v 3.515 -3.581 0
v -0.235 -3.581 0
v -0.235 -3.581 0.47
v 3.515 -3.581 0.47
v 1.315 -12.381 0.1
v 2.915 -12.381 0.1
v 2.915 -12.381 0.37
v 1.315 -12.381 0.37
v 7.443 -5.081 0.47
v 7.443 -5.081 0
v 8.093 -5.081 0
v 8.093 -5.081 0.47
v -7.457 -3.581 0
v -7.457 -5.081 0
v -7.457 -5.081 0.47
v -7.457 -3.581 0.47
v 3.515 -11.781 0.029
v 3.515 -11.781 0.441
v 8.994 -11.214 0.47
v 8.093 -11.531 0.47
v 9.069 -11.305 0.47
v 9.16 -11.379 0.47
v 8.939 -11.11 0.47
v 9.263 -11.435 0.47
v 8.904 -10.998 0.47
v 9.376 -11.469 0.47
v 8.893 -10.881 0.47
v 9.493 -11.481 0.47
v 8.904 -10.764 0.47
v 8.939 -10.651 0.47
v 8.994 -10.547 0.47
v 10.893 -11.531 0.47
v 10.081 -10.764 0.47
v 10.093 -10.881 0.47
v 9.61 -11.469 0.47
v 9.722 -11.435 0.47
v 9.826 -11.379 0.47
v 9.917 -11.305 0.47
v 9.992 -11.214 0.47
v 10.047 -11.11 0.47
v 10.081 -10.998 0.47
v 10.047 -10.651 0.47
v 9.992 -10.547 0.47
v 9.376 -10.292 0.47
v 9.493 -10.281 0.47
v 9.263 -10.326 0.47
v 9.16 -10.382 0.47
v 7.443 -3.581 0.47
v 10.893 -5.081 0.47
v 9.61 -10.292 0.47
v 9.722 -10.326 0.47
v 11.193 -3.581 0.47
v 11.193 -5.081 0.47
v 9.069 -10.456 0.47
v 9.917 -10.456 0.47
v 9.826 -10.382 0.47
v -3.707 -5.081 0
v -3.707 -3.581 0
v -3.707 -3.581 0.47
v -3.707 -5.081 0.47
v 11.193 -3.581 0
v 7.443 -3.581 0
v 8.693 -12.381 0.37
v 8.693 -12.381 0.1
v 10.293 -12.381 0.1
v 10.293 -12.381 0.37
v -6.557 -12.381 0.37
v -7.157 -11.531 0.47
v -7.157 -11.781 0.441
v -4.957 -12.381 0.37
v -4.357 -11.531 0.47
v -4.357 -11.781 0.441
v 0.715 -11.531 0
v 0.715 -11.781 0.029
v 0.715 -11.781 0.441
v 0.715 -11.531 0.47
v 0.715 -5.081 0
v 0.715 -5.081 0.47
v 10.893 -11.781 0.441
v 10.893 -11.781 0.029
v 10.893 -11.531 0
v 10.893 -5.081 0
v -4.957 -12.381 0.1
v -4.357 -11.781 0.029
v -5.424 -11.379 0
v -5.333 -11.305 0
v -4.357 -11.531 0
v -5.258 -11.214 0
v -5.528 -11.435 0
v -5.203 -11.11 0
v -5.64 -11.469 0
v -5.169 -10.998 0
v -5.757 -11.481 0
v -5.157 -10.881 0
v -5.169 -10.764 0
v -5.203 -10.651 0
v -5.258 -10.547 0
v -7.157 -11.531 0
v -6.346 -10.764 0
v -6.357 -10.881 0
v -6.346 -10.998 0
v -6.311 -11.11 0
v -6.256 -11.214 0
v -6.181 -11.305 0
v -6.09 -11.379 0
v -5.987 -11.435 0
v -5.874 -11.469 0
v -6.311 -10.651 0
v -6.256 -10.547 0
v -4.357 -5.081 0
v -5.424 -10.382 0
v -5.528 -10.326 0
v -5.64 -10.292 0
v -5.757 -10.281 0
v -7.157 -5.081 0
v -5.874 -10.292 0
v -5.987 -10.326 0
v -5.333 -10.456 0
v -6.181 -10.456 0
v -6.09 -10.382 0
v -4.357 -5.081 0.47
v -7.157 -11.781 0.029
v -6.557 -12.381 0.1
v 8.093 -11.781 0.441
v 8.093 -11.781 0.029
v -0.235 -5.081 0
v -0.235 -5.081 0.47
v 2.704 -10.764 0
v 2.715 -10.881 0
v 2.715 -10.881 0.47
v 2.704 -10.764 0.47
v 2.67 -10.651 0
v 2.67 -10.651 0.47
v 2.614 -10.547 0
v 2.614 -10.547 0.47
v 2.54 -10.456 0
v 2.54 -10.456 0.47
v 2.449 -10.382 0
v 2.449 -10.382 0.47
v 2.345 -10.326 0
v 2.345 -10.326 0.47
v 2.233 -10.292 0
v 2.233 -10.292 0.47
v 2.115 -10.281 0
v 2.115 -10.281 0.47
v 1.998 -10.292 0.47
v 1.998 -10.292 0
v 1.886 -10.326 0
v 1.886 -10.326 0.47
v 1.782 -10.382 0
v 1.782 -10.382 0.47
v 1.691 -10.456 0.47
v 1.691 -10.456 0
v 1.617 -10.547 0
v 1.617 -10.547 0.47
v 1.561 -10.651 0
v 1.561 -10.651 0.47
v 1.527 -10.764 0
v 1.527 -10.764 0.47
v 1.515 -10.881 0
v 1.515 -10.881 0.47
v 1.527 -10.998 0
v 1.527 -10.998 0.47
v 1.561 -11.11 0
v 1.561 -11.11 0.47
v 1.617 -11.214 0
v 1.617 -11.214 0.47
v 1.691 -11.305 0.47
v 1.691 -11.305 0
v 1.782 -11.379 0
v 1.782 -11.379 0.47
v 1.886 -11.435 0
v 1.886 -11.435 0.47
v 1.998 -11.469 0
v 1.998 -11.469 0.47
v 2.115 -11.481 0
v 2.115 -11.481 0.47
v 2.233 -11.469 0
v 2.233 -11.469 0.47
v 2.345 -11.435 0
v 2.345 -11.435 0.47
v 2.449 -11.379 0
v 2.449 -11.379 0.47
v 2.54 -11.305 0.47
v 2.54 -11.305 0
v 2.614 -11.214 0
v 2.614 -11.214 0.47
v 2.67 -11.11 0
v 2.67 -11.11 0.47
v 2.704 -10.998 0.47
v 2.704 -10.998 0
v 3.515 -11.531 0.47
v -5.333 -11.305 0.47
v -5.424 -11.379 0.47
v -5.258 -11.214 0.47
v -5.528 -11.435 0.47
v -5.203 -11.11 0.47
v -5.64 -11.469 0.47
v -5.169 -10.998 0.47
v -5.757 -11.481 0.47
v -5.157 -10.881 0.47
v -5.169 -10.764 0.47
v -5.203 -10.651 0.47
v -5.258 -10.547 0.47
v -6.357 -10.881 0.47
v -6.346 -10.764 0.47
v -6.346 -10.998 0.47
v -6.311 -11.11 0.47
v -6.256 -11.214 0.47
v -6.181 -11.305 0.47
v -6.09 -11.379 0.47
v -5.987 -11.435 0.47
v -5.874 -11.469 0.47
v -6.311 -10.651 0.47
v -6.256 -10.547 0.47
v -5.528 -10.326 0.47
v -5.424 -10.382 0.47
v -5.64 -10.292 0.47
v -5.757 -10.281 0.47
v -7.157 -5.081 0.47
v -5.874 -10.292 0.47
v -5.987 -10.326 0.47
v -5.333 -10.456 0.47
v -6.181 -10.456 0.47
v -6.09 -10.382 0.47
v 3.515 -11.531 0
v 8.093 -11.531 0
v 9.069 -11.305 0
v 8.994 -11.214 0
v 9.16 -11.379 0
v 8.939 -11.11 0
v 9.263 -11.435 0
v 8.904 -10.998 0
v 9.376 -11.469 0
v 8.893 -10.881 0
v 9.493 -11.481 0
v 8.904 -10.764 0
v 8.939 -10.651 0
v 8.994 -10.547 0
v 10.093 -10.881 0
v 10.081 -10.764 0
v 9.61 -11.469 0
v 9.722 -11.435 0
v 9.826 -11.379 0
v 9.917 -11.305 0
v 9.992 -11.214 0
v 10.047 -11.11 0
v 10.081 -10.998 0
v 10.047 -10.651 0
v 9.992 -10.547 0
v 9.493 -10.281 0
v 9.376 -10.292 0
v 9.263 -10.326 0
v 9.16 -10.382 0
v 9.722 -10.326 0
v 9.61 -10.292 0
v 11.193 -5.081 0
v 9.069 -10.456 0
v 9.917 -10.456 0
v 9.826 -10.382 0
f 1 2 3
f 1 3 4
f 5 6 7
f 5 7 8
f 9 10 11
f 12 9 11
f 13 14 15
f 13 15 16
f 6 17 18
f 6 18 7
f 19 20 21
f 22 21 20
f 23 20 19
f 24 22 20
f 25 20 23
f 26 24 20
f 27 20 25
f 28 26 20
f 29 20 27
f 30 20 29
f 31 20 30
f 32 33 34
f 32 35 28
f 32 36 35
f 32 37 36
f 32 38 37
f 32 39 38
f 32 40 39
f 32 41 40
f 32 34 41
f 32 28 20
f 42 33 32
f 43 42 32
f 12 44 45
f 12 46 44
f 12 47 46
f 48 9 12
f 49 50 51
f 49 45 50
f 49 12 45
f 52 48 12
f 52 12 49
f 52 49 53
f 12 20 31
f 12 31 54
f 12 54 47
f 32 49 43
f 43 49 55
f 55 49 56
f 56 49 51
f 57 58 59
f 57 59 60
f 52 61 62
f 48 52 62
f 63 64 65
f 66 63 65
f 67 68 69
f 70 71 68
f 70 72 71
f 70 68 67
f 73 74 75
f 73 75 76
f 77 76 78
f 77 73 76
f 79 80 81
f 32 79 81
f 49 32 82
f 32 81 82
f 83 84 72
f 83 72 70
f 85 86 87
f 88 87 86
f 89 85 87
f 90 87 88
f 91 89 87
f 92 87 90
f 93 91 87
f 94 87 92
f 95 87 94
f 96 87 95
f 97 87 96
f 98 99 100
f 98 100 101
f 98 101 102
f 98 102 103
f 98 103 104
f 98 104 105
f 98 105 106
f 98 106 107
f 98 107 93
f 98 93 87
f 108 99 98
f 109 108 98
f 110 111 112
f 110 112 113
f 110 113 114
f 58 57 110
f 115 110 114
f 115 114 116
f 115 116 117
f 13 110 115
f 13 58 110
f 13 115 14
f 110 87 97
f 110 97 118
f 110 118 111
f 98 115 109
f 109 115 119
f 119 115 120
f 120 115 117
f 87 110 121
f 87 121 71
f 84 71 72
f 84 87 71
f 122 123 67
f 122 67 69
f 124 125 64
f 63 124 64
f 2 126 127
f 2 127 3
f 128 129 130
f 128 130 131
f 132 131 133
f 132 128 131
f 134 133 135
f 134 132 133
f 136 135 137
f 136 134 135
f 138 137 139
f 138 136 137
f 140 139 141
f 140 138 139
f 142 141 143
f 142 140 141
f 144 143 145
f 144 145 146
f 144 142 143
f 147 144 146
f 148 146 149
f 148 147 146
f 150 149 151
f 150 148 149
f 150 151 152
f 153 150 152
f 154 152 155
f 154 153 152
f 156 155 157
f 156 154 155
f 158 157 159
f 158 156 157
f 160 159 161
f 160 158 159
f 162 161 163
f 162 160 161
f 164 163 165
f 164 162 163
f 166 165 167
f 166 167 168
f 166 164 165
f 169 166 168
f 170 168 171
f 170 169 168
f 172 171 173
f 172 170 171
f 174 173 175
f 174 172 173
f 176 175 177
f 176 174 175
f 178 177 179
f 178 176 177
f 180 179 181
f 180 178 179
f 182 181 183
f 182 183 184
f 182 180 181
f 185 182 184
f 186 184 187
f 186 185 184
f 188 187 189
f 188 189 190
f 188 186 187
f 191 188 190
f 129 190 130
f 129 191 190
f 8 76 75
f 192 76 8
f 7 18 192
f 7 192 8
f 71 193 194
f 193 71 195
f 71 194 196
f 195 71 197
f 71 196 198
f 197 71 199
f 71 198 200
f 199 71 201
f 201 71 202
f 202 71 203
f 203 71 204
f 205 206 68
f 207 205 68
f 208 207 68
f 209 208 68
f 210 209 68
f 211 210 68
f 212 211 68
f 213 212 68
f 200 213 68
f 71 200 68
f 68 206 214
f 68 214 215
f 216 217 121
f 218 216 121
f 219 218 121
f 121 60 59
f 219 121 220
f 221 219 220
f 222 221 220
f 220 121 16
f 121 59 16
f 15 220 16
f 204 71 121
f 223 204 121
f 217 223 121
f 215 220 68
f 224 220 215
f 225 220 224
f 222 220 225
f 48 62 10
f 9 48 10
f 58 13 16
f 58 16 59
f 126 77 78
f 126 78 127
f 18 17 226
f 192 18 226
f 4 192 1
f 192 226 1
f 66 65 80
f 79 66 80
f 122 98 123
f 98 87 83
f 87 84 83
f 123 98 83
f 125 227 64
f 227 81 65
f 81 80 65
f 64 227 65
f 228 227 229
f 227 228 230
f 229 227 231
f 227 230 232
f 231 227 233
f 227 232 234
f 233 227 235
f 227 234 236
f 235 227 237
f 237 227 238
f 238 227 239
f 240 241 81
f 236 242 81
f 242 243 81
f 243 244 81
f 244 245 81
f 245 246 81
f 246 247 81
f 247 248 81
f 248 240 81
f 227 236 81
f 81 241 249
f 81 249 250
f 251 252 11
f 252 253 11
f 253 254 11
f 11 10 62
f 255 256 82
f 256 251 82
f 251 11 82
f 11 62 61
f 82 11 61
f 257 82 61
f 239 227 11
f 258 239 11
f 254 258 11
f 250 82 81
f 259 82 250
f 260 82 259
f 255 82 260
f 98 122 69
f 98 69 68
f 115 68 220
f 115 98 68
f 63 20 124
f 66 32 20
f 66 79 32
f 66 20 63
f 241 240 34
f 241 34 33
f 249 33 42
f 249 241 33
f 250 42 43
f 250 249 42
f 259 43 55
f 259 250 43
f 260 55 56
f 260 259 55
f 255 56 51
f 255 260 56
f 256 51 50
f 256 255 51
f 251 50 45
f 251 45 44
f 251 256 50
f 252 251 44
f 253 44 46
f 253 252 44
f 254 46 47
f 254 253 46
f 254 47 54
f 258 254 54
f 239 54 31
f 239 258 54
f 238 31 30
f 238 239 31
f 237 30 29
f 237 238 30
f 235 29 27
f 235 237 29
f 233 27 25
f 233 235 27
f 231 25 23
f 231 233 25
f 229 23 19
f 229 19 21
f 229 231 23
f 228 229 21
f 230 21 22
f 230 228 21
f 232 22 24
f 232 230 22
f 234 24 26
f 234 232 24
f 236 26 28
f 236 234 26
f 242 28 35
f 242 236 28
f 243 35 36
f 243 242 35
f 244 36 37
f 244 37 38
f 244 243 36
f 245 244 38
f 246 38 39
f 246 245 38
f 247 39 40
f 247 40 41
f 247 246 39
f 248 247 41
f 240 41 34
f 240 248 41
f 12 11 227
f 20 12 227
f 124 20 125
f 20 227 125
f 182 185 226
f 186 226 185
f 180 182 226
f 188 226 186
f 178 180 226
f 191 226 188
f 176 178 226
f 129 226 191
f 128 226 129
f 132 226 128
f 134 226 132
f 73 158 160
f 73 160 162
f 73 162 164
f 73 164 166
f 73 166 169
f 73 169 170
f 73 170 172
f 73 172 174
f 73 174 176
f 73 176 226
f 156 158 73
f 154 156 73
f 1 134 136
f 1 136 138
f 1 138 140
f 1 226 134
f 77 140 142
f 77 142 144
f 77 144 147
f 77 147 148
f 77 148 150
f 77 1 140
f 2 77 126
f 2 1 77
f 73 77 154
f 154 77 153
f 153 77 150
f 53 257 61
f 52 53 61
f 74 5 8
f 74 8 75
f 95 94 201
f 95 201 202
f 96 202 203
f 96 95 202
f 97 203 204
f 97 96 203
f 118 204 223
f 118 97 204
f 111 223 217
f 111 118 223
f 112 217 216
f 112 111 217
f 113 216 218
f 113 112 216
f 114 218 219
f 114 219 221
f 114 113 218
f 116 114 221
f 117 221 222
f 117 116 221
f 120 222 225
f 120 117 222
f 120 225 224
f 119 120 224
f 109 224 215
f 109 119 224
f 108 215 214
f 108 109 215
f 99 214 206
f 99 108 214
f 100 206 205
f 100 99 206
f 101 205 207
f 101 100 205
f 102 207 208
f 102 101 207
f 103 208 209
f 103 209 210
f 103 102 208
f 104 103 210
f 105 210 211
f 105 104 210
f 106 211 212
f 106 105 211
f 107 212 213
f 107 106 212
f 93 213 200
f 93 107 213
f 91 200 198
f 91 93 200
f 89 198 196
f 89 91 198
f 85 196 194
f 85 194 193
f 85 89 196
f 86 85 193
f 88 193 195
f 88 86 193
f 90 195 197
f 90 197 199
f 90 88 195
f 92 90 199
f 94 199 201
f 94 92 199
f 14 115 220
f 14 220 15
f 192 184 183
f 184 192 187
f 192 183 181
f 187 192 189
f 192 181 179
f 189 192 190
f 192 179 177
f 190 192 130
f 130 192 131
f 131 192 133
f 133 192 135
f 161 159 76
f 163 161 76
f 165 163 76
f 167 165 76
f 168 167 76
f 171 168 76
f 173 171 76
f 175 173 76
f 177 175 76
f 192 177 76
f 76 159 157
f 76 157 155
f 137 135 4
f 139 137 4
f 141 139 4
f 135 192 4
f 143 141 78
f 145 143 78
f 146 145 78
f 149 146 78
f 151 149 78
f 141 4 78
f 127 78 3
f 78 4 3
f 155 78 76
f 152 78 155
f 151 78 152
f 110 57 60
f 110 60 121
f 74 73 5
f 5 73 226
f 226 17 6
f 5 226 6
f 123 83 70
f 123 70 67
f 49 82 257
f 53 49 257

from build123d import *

# Parameters (mm, degrees)
SKETCH1_R               = 0.6
BOSS_EXTRUDE1_DEPTH     = 0.47
BOSS_EXTRUDE1_2_DEPTH   = 0.47
BOSS_EXTRUDE1_3_DEPTH   = 0.47
CUT_EXTRUDE1_DEPTH      = 12.192857143
CUT_EXTRUDE1_DEPTH_BACK = 8.457142857


with BuildPart() as part:
    # Sketch1 → Boss-Extrude1 (new body)
    with BuildSketch(Plane.XY):
        Polygon((-7.457142857, -3.580592992), (-3.707142857, -3.580592992), (-3.707142857, -5.080592992), (-4.357142857, -5.080592992), (-4.357142857, -11.780592992), (-4.957142857, -12.380592992), (-6.557142857, -12.380592992), (-7.157142857, -11.780592992), (-7.157142857, -5.080592992), (-7.457142857, -5.080592992), align=None)
        with Locations((-5.757142857, -10.880592992)):
            Circle(SKETCH1_R, mode=Mode.SUBTRACT)
    extrude(amount=BOSS_EXTRUDE1_DEPTH)


with BuildPart() as body_2:
    # Sketch1 → Boss-Extrude1 2 (new body)
    with BuildSketch(Plane.XY):
        Polygon((-0.234501348, -3.580592992), (3.515498652, -3.580592992), (3.515498652, -5.080592992), (3.515498652, -11.780592992), (2.915498652, -12.380592992), (1.315498652, -12.380592992), (0.715498652, -11.780592992), (0.715498652, -5.080592992), (-0.234501348, -5.080592992), align=None)
        with Locations((2.115498652, -10.880592992)):
            Circle(SKETCH1_R, mode=Mode.SUBTRACT)
    extrude(amount=BOSS_EXTRUDE1_2_DEPTH)


with BuildPart() as body_3:
    # Sketch1 → Boss-Extrude1 3 (new body)
    with BuildSketch(Plane.XY):
        Polygon((11.192857143, -3.580592992), (7.442857143, -3.580592992), (7.442857143, -5.080592992), (8.092857143, -5.080592992), (8.092857143, -11.780592992), (8.692857143, -12.380592992), (10.292857143, -12.380592992), (10.892857143, -11.780592992), (10.892857143, -5.080592992), (11.192857143, -5.080592992), align=None)
        with Locations((9.492857143, -10.880592992)):
            Circle(SKETCH1_R, mode=Mode.SUBTRACT)
    extrude(amount=BOSS_EXTRUDE1_3_DEPTH)


with BuildPart() as cut_extrude1_tool:
    # Sketch2 → Cut-Extrude1 (new body, two sides)
    with BuildSketch(Plane(origin=(0, 0, 0), x_dir=(0, 0, -1), z_dir=(1, 0, 0))) as cut_extrude1_sk:
        Polygon((-0.47, -11.530592992), (-0.37, -12.380592992), (-0.47, -12.380592992), align=None)
        Polygon((-0.1, -12.380592992), (0, -12.380592992), (0, -11.530592992), align=None)
    extrude(amount=CUT_EXTRUDE1_DEPTH)
    extrude(cut_extrude1_sk.sketch, amount=-CUT_EXTRUDE1_DEPTH_BACK)


with BuildPart() as part_1:
    add(part.part)

    # Cut-Extrude1: cut by cut_extrude1_tool
    add(cut_extrude1_tool.part, mode=Mode.SUBTRACT)


with BuildPart() as body_2_1:
    add(body_2.part)

    # Cut-Extrude1: cut by cut_extrude1_tool
    add(cut_extrude1_tool.part, mode=Mode.SUBTRACT)


with BuildPart() as body_3_1:
    add(body_3.part)

    # Cut-Extrude1: cut by cut_extrude1_tool
    add(cut_extrude1_tool.part, mode=Mode.SUBTRACT)


solid = Compound([part_1.part, body_2_1.part, body_3_1.part])
